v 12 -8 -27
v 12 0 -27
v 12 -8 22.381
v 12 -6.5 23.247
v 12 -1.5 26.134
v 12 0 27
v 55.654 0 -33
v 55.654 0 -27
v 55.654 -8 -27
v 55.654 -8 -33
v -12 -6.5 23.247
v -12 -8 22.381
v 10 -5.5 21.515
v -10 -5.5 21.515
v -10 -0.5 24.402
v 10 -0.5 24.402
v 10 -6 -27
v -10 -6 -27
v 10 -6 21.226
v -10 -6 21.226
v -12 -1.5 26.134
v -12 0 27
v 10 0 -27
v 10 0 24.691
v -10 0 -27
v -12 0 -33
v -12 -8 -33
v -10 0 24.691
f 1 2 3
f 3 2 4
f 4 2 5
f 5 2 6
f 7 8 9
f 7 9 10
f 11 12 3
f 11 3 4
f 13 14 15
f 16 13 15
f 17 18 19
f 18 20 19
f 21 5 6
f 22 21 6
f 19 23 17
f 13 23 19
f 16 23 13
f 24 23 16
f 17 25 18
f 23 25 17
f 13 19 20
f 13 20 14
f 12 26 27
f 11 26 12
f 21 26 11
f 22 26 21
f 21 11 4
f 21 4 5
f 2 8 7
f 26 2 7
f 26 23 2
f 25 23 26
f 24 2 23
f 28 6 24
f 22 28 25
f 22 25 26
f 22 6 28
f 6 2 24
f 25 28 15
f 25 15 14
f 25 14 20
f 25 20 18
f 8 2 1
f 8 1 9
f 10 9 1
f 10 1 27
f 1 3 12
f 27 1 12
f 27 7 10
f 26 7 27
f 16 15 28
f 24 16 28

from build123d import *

# Parameters (mm, degrees)
F0_W     = 20
F0_H     = 50
F0_H_2   = 2
F1_DEPTH = 8
F3_DEPTH = 50
F4_DEPTH = 25.4
F5_T     = -2
F6_W     = 2
F6_H     = 4
F6_H_2   = 2
F6_W_2   = 20
F6_W_3   = 43.6544959545
F7_DEPTH = 8


with BuildPart() as f1:
    # F0 (on Front) → F1 (new body)
    with BuildSketch(Plane.XZ):
        Polygon((12, 27), (-12, 27), (-12, -27), (-10, -27), (-10, -25), (-10, 25), (10, 25), (10, -25), (10, -27), (12, -27), align=None)
        Rectangle(F0_W, F0_H)
        with Locations((0, -26)):
            Rectangle(F0_W, F0_H_2)
    extrude(amount=F1_DEPTH)

    # F2 (on Right) → F3 (cut)
    with BuildSketch(Plane.YZ):
        Polygon((-6.5, 23.2472232503), (-1.5, 26.1339745962), (0, 27), (-8, 27), (-8, 22.3811978465), align=None)
    extrude(amount=-F3_DEPTH, mode=Mode.SUBTRACT)

    # F2 (on Right) → F4 (cut)
    with BuildSketch(Plane.YZ):
        Polygon((-6.5, 23.2472232503), (-1.5, 26.1339745962), (0, 27), (-8, 27), (-8, 22.3811978465), align=None)
    extrude(amount=F4_DEPTH, mode=Mode.SUBTRACT)

    # F5
    f5_openings = [f1.faces().sort_by_distance(p)[0] for p in [
        (0, 0, 0),
        (0, -4, -27),
    ]]
    offset(amount=F5_T, openings=f5_openings)

    # F6 (on face) → F7 (join)
    with BuildSketch(Plane(origin=(0, 0, 0), x_dir=(-1, 0, 0), z_dir=(0, 1, 0))):
        with Locations((11, -29)):
            Rectangle(F6_W, F6_H)
        with Locations((11, -32)):
            Rectangle(F6_W, F6_H_2)
        Polygon((10, -31), (10, -27), (-10, -27), (-10, -29), (-53.6544959545, -29), (-53.6544959545, -31), (-10, -31), align=None)
        with Locations((0, -32)):
            Rectangle(F6_W_2, F6_H_2)
        Polygon((-10, -29), (-10, -27), (-12, -27), (-53.6544959545, -27), (-53.6544959545, -29), align=None)
        with Locations((-31.8272479773, -32)):
            Rectangle(F6_W_3, F6_H_2)
        with Locations((-54.6544959545, -32)):
            Rectangle(F6_W, F6_H_2)
        with Locations((-54.6544959545, -30)):
            Rectangle(F6_W, F6_H_2)
        with Locations((-54.6544959545, -28)):
            Rectangle(F6_W, F6_H_2)
    extrude(amount=-F7_DEPTH)


solid = f1.part
